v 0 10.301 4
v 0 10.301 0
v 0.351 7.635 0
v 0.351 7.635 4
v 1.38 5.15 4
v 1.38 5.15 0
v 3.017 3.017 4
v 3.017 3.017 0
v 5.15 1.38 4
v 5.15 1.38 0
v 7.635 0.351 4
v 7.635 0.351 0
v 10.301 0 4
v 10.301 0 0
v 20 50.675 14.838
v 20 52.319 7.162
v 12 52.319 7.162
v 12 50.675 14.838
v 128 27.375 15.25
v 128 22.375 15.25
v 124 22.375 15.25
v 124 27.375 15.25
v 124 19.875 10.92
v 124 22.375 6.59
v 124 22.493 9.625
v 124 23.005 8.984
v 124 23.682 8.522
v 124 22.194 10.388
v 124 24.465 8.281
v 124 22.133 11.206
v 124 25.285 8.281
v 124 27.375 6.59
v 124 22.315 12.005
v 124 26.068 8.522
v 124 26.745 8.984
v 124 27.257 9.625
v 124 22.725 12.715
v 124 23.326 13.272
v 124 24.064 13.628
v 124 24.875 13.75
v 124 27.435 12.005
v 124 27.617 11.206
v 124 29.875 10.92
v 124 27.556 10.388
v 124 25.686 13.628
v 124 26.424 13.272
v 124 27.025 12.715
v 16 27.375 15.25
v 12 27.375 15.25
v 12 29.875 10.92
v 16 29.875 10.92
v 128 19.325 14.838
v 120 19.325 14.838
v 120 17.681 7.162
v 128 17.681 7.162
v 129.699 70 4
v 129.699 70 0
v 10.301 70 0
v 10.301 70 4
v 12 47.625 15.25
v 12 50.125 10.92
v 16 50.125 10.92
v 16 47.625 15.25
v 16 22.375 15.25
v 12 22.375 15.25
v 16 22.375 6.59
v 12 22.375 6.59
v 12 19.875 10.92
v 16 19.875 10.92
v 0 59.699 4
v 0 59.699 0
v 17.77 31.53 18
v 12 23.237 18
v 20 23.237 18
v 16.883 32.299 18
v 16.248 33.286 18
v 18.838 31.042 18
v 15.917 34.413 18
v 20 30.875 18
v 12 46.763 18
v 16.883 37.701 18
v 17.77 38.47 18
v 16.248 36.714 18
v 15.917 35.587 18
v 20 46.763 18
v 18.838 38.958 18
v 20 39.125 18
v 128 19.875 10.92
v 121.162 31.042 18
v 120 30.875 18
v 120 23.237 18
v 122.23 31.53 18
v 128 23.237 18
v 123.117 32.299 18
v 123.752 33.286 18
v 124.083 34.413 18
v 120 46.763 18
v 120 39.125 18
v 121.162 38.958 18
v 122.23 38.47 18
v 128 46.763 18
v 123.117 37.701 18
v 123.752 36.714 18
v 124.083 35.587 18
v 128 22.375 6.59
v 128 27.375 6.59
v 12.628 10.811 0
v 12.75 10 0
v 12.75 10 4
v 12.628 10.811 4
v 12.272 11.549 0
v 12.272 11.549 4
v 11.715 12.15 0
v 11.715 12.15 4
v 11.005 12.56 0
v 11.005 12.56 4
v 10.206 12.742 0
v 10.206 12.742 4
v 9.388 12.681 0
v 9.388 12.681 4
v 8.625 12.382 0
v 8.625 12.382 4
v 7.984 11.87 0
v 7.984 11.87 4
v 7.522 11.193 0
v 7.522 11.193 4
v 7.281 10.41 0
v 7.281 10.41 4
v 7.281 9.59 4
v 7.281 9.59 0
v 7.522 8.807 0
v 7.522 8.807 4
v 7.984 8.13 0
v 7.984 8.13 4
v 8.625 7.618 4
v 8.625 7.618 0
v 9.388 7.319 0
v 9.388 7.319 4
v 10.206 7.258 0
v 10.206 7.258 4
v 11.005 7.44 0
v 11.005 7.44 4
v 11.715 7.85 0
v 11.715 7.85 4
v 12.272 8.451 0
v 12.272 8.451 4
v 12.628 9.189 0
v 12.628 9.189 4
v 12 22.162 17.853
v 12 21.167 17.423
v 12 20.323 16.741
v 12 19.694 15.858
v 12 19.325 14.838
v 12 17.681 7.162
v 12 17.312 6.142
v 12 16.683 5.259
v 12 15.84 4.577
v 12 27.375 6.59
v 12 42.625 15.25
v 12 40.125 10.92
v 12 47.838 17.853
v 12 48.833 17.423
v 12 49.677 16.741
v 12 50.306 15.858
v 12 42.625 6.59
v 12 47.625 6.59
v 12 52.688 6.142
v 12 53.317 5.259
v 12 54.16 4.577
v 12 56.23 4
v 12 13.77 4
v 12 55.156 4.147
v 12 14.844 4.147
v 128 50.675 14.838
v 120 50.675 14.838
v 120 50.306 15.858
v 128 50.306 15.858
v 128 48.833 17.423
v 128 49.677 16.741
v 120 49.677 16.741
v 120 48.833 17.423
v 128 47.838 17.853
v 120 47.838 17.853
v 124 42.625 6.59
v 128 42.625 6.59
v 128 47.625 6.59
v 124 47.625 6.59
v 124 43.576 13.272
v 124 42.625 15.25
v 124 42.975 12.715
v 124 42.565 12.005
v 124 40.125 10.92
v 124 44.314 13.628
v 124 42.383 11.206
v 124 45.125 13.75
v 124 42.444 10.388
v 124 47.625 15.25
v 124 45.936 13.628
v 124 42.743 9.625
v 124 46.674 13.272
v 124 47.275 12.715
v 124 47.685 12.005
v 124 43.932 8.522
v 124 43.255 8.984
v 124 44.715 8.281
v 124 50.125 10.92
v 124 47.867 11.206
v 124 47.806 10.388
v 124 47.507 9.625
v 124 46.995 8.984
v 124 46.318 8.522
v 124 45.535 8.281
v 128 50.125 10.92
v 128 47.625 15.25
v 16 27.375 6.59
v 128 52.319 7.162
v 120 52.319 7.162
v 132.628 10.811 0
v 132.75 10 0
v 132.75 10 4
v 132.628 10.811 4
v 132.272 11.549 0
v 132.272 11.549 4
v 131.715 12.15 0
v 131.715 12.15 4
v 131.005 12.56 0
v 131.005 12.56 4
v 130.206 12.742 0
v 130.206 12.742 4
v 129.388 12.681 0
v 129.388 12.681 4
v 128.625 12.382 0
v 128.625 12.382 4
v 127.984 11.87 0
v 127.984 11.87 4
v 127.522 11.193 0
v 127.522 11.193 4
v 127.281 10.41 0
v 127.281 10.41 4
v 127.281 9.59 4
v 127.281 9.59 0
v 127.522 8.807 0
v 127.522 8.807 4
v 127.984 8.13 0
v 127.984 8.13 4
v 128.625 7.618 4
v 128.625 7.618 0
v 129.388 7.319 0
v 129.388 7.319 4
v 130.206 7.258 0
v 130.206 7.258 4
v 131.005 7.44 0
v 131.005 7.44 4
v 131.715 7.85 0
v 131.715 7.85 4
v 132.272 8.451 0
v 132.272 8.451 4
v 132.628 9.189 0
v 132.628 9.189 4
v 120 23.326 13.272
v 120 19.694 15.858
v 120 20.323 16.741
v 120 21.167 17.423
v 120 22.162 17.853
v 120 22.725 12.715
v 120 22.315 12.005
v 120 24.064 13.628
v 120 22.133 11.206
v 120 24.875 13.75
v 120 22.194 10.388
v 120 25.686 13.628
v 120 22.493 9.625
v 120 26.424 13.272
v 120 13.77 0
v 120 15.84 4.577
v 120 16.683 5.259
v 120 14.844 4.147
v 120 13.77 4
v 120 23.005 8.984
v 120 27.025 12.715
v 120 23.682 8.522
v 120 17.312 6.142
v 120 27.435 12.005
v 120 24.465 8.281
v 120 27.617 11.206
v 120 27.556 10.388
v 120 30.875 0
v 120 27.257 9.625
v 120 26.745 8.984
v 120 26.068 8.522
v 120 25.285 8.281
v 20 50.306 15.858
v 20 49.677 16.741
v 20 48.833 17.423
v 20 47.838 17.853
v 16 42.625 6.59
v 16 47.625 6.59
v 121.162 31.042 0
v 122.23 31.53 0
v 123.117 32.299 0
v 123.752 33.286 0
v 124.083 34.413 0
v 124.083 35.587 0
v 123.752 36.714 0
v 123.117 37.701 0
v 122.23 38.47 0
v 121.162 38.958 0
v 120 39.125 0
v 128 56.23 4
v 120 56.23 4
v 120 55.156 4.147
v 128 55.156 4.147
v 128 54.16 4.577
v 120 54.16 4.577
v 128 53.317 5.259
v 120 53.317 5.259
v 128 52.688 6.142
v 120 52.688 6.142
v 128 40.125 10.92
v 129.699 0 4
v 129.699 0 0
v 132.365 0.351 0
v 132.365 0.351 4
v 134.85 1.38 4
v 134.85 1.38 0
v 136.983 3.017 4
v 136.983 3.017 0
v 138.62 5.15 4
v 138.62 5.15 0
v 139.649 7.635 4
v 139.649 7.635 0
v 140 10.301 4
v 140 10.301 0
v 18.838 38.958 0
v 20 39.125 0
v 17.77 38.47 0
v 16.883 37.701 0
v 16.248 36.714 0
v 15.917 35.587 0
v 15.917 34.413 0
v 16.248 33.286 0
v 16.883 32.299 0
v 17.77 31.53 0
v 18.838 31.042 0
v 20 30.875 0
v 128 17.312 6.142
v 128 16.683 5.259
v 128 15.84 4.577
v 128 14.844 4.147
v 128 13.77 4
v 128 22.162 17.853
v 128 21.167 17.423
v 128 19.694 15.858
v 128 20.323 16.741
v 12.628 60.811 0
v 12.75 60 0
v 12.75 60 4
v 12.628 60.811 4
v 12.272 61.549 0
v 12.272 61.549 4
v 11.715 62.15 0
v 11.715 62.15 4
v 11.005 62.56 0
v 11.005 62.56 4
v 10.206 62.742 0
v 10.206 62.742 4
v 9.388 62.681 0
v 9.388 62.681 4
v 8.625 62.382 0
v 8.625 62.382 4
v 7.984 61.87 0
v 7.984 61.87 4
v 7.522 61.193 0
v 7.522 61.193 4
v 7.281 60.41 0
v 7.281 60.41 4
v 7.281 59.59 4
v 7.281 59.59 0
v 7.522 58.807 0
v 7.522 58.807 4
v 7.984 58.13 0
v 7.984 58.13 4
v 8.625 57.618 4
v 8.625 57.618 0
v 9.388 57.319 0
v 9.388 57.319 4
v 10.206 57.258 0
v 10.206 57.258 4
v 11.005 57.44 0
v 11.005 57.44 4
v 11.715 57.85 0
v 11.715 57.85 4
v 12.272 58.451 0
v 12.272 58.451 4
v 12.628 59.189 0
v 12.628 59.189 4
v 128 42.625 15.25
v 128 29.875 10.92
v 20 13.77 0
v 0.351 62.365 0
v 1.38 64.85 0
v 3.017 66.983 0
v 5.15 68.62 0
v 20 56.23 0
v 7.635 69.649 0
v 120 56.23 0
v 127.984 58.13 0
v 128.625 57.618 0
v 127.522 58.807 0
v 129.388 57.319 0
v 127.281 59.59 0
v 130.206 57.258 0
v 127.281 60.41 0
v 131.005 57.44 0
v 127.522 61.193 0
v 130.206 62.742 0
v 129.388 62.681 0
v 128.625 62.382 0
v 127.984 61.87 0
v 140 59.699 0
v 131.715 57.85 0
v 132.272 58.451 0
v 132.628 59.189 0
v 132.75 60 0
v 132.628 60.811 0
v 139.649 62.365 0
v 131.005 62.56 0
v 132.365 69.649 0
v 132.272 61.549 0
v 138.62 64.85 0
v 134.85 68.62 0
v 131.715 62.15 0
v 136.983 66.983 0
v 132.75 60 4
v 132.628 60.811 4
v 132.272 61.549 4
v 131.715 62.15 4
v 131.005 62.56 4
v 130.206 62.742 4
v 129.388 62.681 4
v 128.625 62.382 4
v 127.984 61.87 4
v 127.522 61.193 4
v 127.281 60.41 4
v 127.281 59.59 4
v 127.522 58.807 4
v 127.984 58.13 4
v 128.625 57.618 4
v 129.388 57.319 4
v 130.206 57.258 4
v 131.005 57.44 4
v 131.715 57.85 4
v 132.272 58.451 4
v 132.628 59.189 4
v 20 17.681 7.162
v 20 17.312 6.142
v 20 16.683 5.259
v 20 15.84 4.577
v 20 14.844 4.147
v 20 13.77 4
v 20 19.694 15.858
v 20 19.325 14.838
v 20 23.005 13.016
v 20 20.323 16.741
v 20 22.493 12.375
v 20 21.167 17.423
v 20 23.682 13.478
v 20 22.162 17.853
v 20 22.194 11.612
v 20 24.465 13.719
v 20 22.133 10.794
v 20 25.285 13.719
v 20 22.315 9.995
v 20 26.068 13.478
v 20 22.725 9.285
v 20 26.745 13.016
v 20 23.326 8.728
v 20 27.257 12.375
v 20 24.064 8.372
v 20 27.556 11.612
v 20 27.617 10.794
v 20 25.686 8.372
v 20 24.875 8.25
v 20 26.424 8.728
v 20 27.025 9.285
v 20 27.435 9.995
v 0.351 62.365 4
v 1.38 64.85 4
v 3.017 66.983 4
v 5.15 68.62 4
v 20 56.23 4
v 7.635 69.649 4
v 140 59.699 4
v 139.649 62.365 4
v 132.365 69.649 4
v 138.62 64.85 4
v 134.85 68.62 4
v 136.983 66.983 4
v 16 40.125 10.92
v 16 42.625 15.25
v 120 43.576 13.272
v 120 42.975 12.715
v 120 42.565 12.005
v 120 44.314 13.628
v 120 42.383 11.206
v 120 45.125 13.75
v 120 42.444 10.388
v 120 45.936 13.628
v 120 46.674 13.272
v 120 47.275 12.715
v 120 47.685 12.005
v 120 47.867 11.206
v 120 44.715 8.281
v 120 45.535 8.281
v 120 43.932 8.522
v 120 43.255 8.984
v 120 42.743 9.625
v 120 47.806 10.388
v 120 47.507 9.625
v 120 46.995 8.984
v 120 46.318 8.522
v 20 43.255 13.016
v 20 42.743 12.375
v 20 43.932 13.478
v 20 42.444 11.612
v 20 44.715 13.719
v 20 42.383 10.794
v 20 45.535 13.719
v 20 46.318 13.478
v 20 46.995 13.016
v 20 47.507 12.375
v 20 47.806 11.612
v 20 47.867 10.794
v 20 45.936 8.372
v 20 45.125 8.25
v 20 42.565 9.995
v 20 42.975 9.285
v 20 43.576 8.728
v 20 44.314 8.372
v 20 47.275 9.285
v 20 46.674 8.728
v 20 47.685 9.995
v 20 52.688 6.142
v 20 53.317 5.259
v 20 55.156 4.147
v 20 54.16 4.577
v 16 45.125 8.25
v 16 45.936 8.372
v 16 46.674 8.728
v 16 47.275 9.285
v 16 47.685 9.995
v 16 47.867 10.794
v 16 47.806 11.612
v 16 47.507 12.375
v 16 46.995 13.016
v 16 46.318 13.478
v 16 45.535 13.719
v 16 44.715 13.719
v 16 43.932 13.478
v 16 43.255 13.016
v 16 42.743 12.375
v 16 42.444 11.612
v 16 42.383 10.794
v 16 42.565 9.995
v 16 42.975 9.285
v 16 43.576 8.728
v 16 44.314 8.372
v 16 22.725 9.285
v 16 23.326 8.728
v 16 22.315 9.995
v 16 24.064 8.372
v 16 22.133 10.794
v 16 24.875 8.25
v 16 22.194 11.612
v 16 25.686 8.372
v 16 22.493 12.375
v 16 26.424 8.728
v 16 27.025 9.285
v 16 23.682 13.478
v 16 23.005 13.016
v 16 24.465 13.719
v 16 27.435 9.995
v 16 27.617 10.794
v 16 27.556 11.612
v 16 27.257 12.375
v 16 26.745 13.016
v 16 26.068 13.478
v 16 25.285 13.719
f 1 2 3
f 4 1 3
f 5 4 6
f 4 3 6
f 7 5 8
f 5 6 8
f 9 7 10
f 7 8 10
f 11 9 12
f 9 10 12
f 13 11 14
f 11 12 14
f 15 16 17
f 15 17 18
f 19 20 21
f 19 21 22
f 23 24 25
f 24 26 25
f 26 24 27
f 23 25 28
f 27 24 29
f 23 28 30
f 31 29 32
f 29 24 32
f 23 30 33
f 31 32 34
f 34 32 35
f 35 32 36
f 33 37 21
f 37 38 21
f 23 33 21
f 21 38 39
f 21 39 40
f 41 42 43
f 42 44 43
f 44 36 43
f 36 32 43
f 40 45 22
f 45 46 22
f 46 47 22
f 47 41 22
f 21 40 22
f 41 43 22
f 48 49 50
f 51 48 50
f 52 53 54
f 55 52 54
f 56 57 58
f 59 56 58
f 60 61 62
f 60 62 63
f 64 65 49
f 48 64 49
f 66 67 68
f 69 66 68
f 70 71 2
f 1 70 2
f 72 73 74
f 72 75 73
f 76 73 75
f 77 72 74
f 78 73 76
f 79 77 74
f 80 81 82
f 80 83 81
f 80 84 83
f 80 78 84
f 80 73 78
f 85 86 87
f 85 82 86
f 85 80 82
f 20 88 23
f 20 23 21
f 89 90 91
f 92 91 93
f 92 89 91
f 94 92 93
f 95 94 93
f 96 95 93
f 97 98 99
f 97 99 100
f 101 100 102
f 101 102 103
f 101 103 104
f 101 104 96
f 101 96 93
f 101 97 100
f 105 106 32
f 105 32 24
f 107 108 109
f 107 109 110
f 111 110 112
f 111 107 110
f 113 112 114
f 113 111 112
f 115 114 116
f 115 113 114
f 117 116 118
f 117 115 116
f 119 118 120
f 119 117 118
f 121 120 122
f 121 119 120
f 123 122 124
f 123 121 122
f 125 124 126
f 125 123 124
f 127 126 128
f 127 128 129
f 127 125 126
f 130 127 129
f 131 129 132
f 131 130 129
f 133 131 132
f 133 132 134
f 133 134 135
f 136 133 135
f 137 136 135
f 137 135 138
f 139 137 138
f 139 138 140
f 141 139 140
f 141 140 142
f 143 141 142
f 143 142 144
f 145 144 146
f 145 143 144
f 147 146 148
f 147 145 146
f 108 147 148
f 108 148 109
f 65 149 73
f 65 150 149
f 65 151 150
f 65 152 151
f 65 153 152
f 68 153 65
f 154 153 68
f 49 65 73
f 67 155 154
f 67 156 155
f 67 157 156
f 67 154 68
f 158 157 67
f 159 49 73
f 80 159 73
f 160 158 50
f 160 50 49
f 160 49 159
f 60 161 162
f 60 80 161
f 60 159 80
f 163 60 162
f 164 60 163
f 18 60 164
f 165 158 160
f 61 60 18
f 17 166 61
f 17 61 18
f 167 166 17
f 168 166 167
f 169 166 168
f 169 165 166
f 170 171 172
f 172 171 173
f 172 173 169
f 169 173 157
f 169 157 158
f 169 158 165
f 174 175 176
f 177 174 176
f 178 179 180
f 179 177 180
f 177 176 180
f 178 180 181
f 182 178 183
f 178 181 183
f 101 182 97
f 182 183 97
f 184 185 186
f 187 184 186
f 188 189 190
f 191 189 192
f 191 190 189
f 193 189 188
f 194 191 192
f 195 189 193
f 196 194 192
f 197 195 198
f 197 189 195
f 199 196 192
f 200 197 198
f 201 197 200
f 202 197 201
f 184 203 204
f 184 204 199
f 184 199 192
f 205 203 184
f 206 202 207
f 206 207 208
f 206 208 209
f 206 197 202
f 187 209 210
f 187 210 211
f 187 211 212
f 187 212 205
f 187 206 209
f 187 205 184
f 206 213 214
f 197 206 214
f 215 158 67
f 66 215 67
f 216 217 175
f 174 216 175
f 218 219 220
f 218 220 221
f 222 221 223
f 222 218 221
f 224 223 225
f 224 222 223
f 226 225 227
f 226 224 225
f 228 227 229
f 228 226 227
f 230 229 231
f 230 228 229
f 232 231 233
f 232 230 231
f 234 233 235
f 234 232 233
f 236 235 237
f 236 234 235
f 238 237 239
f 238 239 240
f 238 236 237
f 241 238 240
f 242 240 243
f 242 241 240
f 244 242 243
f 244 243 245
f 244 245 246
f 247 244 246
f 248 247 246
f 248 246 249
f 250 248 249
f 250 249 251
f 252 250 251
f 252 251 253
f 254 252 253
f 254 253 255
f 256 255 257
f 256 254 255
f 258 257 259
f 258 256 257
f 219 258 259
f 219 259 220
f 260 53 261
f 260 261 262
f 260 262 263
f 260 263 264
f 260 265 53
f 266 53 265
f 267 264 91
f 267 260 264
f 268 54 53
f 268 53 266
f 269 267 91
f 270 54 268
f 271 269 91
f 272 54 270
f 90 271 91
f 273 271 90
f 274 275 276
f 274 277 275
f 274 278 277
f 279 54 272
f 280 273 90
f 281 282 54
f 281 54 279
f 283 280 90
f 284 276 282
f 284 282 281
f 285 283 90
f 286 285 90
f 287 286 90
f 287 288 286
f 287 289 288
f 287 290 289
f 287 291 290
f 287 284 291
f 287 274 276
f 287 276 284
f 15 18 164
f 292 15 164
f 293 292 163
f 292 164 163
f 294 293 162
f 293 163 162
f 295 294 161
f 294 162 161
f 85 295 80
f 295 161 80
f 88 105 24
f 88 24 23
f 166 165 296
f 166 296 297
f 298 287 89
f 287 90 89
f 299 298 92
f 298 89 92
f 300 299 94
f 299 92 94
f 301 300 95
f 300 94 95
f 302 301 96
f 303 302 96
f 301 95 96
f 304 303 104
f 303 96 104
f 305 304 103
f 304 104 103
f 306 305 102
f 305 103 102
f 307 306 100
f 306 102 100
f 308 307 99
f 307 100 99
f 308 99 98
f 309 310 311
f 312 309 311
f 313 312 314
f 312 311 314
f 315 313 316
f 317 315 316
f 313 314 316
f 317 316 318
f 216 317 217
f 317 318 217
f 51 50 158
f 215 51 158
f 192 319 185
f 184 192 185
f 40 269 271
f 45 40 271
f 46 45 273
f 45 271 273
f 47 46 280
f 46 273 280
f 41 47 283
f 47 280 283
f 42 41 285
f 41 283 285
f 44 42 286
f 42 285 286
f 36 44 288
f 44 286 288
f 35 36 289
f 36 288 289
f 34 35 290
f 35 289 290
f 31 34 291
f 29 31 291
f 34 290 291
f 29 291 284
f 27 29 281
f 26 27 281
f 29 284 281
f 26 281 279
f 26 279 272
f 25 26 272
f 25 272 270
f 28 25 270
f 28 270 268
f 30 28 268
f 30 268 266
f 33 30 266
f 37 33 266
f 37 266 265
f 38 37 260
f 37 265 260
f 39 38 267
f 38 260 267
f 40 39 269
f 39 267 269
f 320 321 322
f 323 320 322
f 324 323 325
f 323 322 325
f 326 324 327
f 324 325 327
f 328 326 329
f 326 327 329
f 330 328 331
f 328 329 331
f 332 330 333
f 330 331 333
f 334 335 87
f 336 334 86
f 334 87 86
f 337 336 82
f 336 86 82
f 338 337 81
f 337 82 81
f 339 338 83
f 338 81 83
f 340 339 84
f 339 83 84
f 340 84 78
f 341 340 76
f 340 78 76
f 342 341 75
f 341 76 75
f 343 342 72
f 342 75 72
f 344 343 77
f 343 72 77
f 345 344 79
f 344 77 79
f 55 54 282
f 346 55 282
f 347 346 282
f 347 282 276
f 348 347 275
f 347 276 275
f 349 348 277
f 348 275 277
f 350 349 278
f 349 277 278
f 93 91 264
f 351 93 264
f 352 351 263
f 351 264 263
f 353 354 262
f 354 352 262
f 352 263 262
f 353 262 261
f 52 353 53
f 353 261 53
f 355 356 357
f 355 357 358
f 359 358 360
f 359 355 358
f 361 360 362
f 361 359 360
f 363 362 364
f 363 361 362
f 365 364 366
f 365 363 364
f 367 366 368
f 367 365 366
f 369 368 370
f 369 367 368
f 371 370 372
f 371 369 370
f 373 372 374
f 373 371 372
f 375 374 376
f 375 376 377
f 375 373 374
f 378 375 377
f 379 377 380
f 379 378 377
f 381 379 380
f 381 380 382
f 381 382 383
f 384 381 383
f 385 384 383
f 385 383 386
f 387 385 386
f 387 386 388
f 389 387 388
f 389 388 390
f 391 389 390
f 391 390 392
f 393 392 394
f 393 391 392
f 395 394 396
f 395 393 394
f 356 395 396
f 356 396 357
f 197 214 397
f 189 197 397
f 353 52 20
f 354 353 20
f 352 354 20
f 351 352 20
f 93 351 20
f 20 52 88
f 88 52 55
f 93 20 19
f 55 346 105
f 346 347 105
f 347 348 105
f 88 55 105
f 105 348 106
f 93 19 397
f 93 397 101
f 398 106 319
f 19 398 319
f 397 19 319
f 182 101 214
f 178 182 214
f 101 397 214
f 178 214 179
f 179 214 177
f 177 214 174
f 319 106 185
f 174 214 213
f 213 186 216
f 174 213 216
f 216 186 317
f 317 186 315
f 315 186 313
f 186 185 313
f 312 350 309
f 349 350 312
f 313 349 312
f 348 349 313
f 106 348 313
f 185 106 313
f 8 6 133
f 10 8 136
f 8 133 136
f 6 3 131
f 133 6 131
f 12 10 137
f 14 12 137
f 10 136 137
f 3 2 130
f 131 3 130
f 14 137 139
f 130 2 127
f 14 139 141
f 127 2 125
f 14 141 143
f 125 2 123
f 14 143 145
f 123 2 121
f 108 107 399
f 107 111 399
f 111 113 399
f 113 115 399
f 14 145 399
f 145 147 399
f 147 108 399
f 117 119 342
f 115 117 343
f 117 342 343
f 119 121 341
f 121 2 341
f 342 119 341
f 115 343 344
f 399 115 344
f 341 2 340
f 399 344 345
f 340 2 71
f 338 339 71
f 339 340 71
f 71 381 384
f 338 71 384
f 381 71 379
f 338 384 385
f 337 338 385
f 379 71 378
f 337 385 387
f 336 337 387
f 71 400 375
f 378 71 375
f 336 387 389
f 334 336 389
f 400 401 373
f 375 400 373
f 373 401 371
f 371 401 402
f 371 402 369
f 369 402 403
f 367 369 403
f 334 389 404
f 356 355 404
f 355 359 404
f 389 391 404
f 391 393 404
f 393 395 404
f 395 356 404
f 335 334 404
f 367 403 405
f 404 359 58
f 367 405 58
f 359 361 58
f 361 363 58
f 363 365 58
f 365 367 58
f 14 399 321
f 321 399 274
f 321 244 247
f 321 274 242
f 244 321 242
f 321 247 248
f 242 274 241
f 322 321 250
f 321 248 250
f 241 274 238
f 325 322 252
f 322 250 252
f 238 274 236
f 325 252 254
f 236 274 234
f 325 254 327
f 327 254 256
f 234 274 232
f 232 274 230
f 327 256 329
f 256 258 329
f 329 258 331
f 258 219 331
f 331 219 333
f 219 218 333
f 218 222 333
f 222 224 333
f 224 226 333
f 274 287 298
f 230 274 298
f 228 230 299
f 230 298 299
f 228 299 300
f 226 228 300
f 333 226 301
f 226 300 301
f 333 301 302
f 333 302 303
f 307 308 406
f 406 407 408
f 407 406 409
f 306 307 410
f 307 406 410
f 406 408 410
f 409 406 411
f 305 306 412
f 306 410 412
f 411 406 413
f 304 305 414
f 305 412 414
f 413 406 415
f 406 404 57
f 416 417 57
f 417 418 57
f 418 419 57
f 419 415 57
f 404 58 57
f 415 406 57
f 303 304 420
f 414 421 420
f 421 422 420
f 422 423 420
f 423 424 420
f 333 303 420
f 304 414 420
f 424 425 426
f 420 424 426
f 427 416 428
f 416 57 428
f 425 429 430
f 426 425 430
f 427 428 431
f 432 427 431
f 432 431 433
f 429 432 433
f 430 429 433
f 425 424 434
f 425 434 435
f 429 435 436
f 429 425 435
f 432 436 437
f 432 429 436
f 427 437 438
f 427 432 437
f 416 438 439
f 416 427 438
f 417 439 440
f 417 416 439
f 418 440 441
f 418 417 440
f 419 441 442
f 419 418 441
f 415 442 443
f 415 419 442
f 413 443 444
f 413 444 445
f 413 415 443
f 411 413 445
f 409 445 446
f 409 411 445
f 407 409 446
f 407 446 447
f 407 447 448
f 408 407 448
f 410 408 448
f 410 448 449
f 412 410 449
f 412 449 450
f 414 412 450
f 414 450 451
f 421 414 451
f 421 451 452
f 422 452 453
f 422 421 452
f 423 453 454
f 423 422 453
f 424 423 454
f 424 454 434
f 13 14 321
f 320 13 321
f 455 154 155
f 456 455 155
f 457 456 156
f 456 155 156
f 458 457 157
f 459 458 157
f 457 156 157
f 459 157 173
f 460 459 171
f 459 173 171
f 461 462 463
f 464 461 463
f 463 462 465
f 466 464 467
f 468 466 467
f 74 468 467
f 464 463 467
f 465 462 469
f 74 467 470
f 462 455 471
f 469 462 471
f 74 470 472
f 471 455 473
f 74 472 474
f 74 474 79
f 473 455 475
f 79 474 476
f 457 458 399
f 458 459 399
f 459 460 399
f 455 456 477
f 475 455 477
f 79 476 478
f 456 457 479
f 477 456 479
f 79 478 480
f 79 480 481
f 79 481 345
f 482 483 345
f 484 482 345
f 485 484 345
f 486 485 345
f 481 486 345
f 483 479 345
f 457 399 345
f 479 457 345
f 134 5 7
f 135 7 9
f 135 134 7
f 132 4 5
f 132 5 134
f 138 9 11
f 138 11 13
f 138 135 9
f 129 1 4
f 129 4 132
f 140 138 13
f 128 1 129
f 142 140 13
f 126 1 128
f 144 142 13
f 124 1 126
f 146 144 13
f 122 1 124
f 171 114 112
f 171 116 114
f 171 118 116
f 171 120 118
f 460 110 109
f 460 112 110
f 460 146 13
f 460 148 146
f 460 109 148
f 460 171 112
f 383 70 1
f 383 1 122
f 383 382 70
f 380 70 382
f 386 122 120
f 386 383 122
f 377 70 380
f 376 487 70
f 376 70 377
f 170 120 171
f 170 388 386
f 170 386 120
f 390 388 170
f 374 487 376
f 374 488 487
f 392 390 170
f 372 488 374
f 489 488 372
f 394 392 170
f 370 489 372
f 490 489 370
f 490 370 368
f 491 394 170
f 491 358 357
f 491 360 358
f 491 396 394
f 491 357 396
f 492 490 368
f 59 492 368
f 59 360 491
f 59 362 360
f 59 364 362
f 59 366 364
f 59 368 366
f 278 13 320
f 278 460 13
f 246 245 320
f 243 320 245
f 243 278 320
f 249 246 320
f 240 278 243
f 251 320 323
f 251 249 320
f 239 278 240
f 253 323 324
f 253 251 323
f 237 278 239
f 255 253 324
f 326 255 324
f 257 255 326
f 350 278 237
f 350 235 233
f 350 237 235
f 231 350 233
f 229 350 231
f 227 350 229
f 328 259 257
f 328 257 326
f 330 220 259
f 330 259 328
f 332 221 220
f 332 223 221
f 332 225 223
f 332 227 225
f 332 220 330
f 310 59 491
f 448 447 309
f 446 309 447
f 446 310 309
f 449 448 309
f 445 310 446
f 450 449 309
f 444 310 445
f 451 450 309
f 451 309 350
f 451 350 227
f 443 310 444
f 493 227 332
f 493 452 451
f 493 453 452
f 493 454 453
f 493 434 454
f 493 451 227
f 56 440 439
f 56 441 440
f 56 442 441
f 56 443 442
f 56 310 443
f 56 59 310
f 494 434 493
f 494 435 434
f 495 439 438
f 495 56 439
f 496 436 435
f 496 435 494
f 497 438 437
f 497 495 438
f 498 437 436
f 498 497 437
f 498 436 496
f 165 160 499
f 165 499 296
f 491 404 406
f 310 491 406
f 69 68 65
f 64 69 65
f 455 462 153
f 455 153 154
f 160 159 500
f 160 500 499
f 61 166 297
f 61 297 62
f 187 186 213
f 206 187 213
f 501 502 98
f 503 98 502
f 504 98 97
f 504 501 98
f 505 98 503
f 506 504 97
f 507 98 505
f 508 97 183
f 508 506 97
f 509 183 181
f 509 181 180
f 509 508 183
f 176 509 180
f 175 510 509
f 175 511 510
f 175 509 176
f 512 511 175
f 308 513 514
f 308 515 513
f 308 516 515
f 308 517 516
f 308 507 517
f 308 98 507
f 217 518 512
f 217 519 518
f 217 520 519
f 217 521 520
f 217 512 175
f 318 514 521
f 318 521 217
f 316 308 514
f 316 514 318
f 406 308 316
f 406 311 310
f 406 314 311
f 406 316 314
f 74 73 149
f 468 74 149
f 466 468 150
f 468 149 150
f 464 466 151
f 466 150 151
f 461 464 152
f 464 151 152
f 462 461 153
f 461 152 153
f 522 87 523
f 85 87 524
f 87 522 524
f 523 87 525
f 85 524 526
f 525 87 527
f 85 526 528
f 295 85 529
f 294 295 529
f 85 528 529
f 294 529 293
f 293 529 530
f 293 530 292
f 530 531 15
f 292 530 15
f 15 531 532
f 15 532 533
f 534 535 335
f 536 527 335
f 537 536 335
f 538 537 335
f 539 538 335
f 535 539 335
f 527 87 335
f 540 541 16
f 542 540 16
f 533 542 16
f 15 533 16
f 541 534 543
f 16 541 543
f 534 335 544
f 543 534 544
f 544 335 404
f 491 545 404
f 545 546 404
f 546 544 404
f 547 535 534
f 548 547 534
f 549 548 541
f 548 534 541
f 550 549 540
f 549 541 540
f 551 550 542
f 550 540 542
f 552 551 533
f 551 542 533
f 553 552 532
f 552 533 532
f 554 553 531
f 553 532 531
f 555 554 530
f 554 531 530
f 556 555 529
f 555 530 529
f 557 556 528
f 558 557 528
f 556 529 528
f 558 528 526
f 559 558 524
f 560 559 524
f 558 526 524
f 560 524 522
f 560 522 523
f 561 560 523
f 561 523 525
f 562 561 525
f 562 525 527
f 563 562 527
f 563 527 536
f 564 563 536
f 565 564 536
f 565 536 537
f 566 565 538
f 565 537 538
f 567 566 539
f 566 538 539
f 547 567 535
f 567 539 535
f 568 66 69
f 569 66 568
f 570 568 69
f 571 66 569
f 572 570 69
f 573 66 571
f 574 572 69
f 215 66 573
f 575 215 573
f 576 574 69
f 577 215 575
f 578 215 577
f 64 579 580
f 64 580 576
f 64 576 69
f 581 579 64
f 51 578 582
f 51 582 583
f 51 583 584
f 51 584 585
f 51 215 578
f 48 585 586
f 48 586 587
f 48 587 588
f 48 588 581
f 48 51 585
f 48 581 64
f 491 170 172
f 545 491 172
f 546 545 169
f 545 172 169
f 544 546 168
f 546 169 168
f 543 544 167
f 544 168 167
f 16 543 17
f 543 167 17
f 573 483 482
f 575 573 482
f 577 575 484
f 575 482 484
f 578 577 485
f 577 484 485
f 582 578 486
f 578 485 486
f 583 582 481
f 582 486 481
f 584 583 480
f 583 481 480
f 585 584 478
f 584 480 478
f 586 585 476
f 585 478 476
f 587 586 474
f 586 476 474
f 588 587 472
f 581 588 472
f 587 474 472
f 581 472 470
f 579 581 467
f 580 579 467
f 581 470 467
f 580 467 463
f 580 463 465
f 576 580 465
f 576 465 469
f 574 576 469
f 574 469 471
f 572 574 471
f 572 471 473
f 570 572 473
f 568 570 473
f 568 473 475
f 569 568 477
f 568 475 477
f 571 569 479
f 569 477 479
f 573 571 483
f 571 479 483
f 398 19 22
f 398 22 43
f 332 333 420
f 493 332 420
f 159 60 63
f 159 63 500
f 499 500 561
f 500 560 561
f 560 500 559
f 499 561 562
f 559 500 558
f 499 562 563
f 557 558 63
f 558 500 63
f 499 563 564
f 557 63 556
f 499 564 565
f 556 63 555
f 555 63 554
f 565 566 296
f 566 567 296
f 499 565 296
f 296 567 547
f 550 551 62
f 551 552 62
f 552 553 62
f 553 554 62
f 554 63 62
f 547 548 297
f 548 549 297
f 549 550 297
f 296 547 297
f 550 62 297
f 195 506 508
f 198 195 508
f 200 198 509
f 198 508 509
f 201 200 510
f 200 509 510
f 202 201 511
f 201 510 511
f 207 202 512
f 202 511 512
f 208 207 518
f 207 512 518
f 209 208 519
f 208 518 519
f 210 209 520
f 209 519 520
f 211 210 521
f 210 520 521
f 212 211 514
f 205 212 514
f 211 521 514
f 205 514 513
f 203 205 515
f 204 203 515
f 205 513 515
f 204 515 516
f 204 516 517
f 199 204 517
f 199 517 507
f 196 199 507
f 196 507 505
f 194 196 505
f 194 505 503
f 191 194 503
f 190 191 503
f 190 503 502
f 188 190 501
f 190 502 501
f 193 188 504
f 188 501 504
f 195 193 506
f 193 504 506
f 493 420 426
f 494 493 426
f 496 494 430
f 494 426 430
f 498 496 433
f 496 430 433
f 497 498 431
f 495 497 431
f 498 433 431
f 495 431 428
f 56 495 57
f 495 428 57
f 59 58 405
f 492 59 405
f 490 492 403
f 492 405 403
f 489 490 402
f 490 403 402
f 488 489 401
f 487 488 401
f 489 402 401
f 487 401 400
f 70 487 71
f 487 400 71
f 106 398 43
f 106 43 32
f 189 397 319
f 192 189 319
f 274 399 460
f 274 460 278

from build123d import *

# Parameters (mm, degrees)
SKETCH1_R           = 2.75
SKETCH1_W           = 100
SKETCH1_H           = 42.46
BOSS_EXTRUDE2_DEPTH = 4
SKETCH4_W           = 8
SKETCH4_H           = 42.46
BOSS_EXTRUDE3_DEPTH = 14
SKETCH5_R           = 4.125
CUT_EXTRUDE2_DEPTH  = 19
SKETCH7_R           = 2.75
CUT_EXTRUDE3_DEPTH  = 4
SKETCH8_R           = 2.75
CUT_EXTRUDE4_DEPTH  = 4
CUT_EXTRUDE8_DEPTH  = 4
CUT_EXTRUDE9_DEPTH  = 4
CUT_EXTRUDE12_DEPTH = 129


with BuildPart() as part:
    # Sketch1 → Boss-Extrude2 (new body)
    with BuildSketch(Plane.XY):
        with BuildLine():
            Line((140, 10.300871341), (140, 59.699128659))
            ThreePointArc((140, 59.699128659), (136.982944636, 66.982944636), (129.699128659, 70))
            Line((129.699128659, 70), (10.300871341, 70))
            ThreePointArc((10.300871341, 70), (3.017055364, 66.982944636), (0, 59.699128659))
            Line((0, 59.699128659), (0, 10.300871341))
            ThreePointArc((0, 10.300871341), (3.017055364, 3.017055364), (10.300871341, 0))
            Line((10.300871341, 0), (129.699128659, 0))
            ThreePointArc((129.699128659, 0), (136.982944636, 3.017055364), (140, 10.300871341))
        make_face()
        with Locations((10, 10)):
            Circle(SKETCH1_R, mode=Mode.SUBTRACT)
        with Locations((130, 10)):
            Circle(SKETCH1_R, mode=Mode.SUBTRACT)
        with Locations((10, 60)):
            Circle(SKETCH1_R, mode=Mode.SUBTRACT)
        with Locations((70, 35)):
            Rectangle(SKETCH1_W, SKETCH1_H, mode=Mode.SUBTRACT)
        with Locations((130, 60)):
            Circle(SKETCH1_R, mode=Mode.SUBTRACT)
    extrude(amount=BOSS_EXTRUDE2_DEPTH)

    # Sketch4 → Boss-Extrude3 (add)
    with BuildSketch(Plane.XY.offset(4)):
        with Locations((16, 35)):
            Rectangle(SKETCH4_W, SKETCH4_H)
        with Locations((124, 35)):
            Rectangle(SKETCH4_W, SKETCH4_H)
    extrude(amount=BOSS_EXTRUDE3_DEPTH)

    # Sketch5 → Cut-Extrude2 (cut, through all)
    with BuildSketch(Plane.XY.offset(18)):
        with Locations((20, 35)):
            Circle(SKETCH5_R)
        with Locations((120, 35)):
            Circle(SKETCH5_R)
    extrude(amount=-CUT_EXTRUDE2_DEPTH, mode=Mode.SUBTRACT)

    # Sketch7 → Cut-Extrude3 (cut)
    with BuildSketch(Plane(origin=(20, 0, 0), x_dir=(0, 0, -1), z_dir=(1, 0, 0))):
        with Locations((-11, 24.875)):
            Circle(SKETCH7_R)
        with Locations((-11, 45.125)):
            Circle(SKETCH7_R)
    extrude(amount=-CUT_EXTRUDE3_DEPTH, mode=Mode.SUBTRACT)

    # Sketch8 → Cut-Extrude4 (cut)
    with BuildSketch(Plane.ZY.offset(-120)):
        with Locations((11, 24.875)):
            Circle(SKETCH8_R)
        with Locations((11, 45.125)):
            Circle(SKETCH8_R)
    extrude(amount=-CUT_EXTRUDE4_DEPTH, mode=Mode.SUBTRACT)

    # Sketch12 → Cut-Extrude8 (cut)
    with BuildSketch(Plane.ZY.offset(-12)):
        Polygon((10.919872981, 19.875), (15.25, 22.375), (15.25, 27.375), (10.919872981, 29.875), (6.589745962, 27.375), (6.589745962, 22.375), align=None)
        Polygon((10.919872981, 40.125), (6.589745962, 42.625), (6.589745962, 47.625), (10.919872981, 50.125), (15.25, 47.625), (15.25, 42.625), align=None)
    extrude(amount=-CUT_EXTRUDE8_DEPTH, mode=Mode.SUBTRACT)

    # Sketch15 → Cut-Extrude9 (cut)
    with BuildSketch(Plane(origin=(128, 0, 0), x_dir=(0, 0, -1), z_dir=(1, 0, 0))):
        Polygon((-10.919872981, 19.875), (-15.25, 22.375), (-15.25, 27.375), (-10.919872981, 29.875), (-6.589745962, 27.375), (-6.589745962, 22.375), align=None)
        Polygon((-15.25, 47.625), (-15.25, 42.625), (-10.919872981, 40.125), (-6.589745962, 42.625), (-6.589745962, 47.625), (-10.919872981, 50.125), align=None)
    extrude(amount=-CUT_EXTRUDE9_DEPTH, mode=Mode.SUBTRACT)

    # Sketch16 → Cut-Extrude12 (cut, through all)
    with BuildSketch(Plane.ZY.offset(-12)):
        with BuildLine():
            Line((18, 13.77), (18, 23.236659765))
            ThreePointArc((18, 23.236659765), (17.110559955, 20.721820453), (14.837791617, 19.325380536))
            Line((14.837791617, 19.325380536), (7.162208383, 17.681279229))
            ThreePointArc((7.162208383, 17.681279229), (4.889440045, 16.284839312), (4, 13.77))
            Line((4, 13.77), (18, 13.77))
        make_face()
        with BuildLine():
            ThreePointArc((4, 56.23), (4.889440045, 53.715160688), (7.162208383, 52.318720771))
            Line((7.162208383, 52.318720771), (14.837791617, 50.674619464))
            ThreePointArc((14.837791617, 50.674619464), (17.110559955, 49.278179547), (18, 46.763340235))
            Line((18, 46.763340235), (18, 56.23))
            Line((18, 56.23), (4, 56.23))
        make_face()
    extrude(amount=-CUT_EXTRUDE12_DEPTH, mode=Mode.SUBTRACT)


solid = part.part
